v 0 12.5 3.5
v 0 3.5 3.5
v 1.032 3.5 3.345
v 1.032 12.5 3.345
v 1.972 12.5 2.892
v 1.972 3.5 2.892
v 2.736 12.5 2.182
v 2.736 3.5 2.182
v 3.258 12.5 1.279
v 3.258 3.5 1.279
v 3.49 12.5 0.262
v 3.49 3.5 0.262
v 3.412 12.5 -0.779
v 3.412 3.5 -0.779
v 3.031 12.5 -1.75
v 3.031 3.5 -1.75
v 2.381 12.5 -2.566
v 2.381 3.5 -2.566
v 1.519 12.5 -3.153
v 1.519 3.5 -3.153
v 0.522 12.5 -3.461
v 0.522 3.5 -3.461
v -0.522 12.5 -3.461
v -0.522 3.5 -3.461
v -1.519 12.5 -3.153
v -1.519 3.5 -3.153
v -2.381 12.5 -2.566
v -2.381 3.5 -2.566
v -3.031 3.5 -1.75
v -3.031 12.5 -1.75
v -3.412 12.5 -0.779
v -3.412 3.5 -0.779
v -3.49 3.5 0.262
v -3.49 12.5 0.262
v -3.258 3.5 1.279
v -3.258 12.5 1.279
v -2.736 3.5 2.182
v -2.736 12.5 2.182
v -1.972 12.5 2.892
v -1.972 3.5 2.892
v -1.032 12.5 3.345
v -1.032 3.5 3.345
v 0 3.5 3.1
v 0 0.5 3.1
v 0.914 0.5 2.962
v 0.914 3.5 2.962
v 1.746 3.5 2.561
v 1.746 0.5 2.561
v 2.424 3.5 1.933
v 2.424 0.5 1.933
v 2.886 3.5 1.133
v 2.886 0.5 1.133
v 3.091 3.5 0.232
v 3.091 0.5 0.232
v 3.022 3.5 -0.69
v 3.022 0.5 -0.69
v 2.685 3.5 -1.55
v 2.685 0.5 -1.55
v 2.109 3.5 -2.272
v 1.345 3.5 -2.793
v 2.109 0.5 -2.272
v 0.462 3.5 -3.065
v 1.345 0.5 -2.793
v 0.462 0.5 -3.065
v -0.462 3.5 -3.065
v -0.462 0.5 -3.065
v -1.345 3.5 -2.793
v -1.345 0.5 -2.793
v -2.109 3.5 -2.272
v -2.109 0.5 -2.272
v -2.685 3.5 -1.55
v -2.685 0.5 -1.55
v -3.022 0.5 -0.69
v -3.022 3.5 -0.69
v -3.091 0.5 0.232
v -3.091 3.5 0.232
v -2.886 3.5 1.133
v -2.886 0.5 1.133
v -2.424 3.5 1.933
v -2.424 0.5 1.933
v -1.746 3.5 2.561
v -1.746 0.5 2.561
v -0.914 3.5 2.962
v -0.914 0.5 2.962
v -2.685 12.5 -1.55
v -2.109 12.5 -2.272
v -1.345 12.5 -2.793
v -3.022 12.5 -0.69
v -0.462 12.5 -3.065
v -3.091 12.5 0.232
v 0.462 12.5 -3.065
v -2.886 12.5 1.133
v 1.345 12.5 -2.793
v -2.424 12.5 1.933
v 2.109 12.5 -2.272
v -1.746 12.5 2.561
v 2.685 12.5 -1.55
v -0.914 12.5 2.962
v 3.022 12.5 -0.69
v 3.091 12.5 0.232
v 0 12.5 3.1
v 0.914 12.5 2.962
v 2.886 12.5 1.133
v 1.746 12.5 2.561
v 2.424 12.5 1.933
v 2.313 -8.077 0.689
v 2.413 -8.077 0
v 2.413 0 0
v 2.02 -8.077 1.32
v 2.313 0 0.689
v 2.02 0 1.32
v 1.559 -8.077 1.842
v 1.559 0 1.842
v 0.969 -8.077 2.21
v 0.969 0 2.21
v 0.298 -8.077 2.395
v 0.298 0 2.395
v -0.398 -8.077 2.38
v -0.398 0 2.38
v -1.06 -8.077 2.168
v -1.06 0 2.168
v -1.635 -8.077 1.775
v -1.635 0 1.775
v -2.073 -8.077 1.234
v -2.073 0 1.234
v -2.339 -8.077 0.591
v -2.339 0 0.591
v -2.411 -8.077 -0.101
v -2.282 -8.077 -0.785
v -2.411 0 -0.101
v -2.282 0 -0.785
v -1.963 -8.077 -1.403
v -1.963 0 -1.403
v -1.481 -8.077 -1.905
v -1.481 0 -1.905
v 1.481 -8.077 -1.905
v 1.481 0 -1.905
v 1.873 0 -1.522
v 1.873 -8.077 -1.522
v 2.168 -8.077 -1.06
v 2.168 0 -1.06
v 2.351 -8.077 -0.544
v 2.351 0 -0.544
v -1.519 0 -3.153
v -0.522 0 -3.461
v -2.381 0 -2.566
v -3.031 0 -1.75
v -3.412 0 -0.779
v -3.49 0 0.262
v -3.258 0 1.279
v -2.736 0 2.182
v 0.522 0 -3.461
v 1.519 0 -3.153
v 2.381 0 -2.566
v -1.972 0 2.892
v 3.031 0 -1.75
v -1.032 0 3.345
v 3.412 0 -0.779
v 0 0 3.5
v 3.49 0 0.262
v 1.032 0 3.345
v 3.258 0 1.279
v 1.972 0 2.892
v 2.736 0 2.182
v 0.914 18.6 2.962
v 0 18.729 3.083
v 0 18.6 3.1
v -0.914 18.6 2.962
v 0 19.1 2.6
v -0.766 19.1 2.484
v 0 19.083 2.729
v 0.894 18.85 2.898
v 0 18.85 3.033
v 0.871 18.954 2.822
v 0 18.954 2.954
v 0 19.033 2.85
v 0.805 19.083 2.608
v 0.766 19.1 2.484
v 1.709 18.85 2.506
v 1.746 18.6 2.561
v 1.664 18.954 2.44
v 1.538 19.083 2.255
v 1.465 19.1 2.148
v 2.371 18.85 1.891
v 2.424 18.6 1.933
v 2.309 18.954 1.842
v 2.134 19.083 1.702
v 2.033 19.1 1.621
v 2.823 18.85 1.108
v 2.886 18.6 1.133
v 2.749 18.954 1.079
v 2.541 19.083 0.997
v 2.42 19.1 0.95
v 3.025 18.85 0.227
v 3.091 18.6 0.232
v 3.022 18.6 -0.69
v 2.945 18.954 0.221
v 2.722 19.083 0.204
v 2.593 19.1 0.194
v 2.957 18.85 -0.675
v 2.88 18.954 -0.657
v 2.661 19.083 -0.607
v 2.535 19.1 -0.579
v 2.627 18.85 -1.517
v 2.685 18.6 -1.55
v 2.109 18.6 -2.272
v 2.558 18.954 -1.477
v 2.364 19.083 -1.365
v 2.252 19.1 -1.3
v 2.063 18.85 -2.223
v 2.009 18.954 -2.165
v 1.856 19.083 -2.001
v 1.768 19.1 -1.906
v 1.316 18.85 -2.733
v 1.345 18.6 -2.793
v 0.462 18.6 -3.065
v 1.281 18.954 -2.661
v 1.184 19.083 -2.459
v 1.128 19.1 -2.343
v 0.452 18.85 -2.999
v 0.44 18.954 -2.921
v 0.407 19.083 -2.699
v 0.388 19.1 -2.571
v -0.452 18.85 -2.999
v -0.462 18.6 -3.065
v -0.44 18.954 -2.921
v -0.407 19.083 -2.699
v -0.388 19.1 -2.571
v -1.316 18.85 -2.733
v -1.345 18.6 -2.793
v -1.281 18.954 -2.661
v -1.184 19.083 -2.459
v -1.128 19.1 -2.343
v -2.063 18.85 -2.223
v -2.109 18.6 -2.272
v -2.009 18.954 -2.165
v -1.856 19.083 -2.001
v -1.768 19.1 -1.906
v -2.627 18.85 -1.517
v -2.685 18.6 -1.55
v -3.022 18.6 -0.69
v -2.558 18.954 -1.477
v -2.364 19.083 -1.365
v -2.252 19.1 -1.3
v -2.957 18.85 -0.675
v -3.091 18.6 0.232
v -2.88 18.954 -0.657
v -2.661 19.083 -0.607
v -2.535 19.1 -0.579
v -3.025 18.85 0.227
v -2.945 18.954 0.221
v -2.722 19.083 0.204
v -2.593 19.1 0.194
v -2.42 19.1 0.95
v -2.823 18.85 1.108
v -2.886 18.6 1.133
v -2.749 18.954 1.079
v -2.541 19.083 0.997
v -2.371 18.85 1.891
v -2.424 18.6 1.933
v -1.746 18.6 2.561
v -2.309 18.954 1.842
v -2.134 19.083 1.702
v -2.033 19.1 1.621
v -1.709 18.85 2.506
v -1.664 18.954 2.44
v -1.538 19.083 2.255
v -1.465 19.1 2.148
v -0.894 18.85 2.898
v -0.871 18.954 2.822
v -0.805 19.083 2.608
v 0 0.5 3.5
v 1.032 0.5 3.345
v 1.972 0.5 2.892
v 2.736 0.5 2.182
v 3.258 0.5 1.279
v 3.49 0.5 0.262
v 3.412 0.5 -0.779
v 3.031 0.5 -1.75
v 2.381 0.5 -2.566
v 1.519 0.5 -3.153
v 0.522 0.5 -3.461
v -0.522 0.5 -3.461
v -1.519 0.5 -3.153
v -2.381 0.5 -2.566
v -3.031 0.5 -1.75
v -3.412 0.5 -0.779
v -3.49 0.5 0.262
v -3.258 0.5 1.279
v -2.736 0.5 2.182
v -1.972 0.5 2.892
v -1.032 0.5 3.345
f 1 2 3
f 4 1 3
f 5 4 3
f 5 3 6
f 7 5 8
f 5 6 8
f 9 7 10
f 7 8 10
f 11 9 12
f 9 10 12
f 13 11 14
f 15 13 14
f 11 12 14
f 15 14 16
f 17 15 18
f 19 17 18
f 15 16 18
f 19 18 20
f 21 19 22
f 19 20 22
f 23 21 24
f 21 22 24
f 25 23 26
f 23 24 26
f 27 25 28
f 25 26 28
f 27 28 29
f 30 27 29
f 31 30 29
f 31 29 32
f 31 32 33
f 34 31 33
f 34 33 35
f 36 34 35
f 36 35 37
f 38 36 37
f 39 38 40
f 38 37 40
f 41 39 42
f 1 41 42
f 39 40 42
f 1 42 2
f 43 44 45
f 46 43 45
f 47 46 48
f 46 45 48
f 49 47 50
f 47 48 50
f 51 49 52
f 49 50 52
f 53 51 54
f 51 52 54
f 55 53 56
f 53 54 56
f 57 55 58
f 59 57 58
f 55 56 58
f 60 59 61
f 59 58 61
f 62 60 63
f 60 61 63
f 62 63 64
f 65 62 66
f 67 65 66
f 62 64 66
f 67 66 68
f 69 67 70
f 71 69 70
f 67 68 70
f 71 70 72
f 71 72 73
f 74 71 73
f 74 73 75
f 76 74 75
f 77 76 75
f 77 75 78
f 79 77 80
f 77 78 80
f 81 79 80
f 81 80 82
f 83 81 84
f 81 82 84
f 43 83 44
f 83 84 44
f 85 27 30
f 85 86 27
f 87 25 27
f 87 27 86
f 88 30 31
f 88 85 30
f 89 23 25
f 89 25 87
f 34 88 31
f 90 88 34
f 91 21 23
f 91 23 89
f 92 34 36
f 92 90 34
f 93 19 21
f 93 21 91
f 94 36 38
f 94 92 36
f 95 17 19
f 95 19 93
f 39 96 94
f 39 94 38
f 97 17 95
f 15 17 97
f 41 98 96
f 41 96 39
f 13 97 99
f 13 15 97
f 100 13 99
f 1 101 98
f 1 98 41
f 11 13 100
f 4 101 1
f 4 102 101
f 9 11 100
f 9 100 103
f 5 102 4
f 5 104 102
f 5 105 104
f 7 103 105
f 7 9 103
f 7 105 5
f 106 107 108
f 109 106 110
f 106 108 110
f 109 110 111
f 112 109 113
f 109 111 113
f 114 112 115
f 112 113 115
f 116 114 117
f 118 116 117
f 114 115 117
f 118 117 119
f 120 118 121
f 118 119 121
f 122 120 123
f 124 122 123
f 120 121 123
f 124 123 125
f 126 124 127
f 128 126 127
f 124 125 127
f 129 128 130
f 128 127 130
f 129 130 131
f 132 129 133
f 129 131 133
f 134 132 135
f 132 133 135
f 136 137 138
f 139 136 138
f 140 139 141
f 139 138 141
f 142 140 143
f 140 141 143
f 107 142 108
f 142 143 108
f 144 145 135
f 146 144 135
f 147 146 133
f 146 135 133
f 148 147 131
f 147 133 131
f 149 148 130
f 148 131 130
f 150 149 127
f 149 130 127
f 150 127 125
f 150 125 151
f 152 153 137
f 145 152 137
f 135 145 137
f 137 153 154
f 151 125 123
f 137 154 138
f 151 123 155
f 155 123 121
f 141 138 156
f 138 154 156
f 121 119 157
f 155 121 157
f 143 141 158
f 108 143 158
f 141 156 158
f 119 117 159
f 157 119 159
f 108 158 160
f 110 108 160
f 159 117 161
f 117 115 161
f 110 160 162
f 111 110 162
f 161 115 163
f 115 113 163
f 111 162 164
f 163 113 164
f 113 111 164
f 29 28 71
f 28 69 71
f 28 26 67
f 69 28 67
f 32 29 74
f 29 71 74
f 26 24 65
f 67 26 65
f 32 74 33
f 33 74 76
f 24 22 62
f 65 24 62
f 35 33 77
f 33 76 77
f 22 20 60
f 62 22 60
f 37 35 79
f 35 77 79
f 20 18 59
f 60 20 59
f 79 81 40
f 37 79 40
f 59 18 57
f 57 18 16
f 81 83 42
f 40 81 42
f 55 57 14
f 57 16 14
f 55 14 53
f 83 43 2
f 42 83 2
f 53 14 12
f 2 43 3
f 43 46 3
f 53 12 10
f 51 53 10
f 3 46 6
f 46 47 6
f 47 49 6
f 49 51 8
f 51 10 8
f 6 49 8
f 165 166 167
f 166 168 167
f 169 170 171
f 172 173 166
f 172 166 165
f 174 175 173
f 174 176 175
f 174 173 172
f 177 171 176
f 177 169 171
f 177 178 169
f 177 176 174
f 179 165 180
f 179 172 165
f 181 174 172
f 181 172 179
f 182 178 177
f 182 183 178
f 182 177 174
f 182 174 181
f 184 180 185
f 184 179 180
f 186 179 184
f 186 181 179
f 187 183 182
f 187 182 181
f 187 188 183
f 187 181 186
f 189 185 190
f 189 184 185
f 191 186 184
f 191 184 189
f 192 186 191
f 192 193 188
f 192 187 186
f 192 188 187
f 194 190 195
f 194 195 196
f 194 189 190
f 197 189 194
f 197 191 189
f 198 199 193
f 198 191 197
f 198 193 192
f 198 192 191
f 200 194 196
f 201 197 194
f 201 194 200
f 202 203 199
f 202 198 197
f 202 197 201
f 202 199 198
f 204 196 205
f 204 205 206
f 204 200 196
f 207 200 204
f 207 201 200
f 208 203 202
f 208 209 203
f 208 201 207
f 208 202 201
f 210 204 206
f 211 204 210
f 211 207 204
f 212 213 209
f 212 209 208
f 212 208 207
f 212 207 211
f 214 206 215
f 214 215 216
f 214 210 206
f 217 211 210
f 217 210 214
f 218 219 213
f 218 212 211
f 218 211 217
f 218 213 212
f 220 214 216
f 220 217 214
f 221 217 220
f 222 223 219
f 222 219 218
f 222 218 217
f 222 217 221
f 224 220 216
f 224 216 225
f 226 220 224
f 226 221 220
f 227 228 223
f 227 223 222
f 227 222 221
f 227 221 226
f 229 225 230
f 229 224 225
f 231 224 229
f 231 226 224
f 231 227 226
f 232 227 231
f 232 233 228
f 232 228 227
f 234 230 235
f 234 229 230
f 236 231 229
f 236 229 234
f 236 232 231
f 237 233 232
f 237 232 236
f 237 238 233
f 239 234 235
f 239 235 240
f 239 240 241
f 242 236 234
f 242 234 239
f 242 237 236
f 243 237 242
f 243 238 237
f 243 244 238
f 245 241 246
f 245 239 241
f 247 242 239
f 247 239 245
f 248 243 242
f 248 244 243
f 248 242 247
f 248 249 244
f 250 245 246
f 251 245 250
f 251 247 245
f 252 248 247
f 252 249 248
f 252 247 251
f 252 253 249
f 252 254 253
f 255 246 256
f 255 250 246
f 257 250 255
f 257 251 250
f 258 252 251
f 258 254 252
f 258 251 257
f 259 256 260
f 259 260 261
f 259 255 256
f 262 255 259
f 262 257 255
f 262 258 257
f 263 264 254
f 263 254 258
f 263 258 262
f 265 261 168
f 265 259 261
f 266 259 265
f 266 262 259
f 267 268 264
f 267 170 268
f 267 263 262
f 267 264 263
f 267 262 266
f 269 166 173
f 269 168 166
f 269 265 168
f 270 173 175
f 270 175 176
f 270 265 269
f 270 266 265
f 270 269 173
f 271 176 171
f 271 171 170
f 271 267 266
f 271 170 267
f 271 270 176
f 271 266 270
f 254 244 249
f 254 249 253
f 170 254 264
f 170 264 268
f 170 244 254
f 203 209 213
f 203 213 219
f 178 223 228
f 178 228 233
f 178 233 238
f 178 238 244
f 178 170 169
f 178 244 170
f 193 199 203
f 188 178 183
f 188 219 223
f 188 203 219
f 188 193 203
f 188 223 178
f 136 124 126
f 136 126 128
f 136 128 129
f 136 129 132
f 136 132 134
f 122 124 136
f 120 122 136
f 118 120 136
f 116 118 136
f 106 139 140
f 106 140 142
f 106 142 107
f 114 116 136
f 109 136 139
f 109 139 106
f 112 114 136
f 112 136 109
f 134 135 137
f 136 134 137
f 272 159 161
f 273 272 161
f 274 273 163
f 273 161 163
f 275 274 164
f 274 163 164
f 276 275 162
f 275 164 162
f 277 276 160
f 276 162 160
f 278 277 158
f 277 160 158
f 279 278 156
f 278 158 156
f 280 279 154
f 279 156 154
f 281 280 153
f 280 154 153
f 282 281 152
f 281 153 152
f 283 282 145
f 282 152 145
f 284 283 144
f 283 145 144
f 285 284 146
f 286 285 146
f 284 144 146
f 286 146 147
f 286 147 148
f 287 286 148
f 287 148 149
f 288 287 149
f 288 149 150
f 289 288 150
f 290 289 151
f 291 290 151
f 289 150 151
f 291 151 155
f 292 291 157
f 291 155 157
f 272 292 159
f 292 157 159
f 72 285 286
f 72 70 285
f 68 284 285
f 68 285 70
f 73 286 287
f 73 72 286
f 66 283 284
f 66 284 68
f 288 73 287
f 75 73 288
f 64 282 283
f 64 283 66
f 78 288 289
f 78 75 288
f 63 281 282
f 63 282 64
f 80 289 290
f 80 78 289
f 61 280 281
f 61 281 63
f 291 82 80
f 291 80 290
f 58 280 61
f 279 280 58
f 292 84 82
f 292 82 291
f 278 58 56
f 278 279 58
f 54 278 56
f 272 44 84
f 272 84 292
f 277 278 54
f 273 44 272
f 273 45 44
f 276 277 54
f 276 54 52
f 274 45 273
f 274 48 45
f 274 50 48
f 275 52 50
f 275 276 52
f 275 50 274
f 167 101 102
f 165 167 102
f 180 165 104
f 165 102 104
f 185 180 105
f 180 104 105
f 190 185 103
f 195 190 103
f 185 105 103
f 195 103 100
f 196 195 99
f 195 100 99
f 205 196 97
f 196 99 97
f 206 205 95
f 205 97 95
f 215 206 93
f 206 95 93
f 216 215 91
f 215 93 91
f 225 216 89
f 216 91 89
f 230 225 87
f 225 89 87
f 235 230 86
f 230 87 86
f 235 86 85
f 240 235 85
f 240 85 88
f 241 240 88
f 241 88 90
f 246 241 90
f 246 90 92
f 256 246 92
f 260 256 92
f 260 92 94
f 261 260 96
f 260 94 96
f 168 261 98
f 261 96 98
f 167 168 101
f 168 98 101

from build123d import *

# Parameters (mm, degrees)
SKETCH1_R           = 3.5
BOSS_EXTRUDE1_DEPTH = 0.5
SKETCH2_R           = 3.1
BOSS_EXTRUDE2_DEPTH = 3
SKETCH3_R           = 3.5
BOSS_EXTRUDE3_DEPTH = 9
SKETCH4_R           = 3.1
BOSS_EXTRUDE4_DEPTH = 6.6
FILLET1_R           = 0.5
BOSS_EXTRUDE5_DEPTH = 8.0772


with BuildPart() as part:
    # Sketch1 → Boss-Extrude1 (new body)
    with BuildSketch(Plane(origin=(0, 0, 0), x_dir=(1, 0, 0), z_dir=(0, 1, 0))):
        with Locations(Location((0, 0, 0), (0, 0, 270))):
            Circle(SKETCH1_R)
    extrude(amount=BOSS_EXTRUDE1_DEPTH)

    # Sketch2 → Boss-Extrude2 (add)
    with BuildSketch(Plane(origin=(0, 0.5, 0), x_dir=(1, 0, 0), z_dir=(0, 1, 0))):
        with Locations(Location((0, 0, 0), (0, 0, 270))):
            Circle(SKETCH2_R)
    extrude(amount=BOSS_EXTRUDE2_DEPTH)

    # Sketch3 → Boss-Extrude3 (add)
    with BuildSketch(Plane(origin=(0, 3.5, 0), x_dir=(1, 0, 0), z_dir=(0, 1, 0))):
        with Locations(Location((0, 0, 0), (0, 0, 270))):
            Circle(SKETCH3_R)
    extrude(amount=BOSS_EXTRUDE3_DEPTH)

    # Sketch4 → Boss-Extrude4 (add)
    with BuildSketch(Plane(origin=(0, 12.5, 0), x_dir=(1, 0, 0), z_dir=(0, 1, 0))):
        with Locations(Location((0, 0, 0), (0, 0, 270))):
            Circle(SKETCH4_R)
    extrude(amount=BOSS_EXTRUDE4_DEPTH)

    # Fillet1
    fillet1_edges = [part.edges().sort_by_distance(p)[0] for p in [
        (0, 19.1, -3.1),
    ]]
    fillet(fillet1_edges, radius=FILLET1_R)

    # Sketch5 → Boss-Extrude5 (add)
    with BuildSketch(Plane.XZ):
        with BuildLine():
            ThreePointArc((2.413, 0), (-1.060369493, 2.167529824), (-1.481061781, -1.905))
            Line((-1.481061781, -1.905), (1.481061781, -1.905))
            ThreePointArc((1.481061781, -1.905), (2.167529824, -1.060369493), (2.413, 0))
        make_face()
    extrude(amount=BOSS_EXTRUDE5_DEPTH)


solid = part.part
